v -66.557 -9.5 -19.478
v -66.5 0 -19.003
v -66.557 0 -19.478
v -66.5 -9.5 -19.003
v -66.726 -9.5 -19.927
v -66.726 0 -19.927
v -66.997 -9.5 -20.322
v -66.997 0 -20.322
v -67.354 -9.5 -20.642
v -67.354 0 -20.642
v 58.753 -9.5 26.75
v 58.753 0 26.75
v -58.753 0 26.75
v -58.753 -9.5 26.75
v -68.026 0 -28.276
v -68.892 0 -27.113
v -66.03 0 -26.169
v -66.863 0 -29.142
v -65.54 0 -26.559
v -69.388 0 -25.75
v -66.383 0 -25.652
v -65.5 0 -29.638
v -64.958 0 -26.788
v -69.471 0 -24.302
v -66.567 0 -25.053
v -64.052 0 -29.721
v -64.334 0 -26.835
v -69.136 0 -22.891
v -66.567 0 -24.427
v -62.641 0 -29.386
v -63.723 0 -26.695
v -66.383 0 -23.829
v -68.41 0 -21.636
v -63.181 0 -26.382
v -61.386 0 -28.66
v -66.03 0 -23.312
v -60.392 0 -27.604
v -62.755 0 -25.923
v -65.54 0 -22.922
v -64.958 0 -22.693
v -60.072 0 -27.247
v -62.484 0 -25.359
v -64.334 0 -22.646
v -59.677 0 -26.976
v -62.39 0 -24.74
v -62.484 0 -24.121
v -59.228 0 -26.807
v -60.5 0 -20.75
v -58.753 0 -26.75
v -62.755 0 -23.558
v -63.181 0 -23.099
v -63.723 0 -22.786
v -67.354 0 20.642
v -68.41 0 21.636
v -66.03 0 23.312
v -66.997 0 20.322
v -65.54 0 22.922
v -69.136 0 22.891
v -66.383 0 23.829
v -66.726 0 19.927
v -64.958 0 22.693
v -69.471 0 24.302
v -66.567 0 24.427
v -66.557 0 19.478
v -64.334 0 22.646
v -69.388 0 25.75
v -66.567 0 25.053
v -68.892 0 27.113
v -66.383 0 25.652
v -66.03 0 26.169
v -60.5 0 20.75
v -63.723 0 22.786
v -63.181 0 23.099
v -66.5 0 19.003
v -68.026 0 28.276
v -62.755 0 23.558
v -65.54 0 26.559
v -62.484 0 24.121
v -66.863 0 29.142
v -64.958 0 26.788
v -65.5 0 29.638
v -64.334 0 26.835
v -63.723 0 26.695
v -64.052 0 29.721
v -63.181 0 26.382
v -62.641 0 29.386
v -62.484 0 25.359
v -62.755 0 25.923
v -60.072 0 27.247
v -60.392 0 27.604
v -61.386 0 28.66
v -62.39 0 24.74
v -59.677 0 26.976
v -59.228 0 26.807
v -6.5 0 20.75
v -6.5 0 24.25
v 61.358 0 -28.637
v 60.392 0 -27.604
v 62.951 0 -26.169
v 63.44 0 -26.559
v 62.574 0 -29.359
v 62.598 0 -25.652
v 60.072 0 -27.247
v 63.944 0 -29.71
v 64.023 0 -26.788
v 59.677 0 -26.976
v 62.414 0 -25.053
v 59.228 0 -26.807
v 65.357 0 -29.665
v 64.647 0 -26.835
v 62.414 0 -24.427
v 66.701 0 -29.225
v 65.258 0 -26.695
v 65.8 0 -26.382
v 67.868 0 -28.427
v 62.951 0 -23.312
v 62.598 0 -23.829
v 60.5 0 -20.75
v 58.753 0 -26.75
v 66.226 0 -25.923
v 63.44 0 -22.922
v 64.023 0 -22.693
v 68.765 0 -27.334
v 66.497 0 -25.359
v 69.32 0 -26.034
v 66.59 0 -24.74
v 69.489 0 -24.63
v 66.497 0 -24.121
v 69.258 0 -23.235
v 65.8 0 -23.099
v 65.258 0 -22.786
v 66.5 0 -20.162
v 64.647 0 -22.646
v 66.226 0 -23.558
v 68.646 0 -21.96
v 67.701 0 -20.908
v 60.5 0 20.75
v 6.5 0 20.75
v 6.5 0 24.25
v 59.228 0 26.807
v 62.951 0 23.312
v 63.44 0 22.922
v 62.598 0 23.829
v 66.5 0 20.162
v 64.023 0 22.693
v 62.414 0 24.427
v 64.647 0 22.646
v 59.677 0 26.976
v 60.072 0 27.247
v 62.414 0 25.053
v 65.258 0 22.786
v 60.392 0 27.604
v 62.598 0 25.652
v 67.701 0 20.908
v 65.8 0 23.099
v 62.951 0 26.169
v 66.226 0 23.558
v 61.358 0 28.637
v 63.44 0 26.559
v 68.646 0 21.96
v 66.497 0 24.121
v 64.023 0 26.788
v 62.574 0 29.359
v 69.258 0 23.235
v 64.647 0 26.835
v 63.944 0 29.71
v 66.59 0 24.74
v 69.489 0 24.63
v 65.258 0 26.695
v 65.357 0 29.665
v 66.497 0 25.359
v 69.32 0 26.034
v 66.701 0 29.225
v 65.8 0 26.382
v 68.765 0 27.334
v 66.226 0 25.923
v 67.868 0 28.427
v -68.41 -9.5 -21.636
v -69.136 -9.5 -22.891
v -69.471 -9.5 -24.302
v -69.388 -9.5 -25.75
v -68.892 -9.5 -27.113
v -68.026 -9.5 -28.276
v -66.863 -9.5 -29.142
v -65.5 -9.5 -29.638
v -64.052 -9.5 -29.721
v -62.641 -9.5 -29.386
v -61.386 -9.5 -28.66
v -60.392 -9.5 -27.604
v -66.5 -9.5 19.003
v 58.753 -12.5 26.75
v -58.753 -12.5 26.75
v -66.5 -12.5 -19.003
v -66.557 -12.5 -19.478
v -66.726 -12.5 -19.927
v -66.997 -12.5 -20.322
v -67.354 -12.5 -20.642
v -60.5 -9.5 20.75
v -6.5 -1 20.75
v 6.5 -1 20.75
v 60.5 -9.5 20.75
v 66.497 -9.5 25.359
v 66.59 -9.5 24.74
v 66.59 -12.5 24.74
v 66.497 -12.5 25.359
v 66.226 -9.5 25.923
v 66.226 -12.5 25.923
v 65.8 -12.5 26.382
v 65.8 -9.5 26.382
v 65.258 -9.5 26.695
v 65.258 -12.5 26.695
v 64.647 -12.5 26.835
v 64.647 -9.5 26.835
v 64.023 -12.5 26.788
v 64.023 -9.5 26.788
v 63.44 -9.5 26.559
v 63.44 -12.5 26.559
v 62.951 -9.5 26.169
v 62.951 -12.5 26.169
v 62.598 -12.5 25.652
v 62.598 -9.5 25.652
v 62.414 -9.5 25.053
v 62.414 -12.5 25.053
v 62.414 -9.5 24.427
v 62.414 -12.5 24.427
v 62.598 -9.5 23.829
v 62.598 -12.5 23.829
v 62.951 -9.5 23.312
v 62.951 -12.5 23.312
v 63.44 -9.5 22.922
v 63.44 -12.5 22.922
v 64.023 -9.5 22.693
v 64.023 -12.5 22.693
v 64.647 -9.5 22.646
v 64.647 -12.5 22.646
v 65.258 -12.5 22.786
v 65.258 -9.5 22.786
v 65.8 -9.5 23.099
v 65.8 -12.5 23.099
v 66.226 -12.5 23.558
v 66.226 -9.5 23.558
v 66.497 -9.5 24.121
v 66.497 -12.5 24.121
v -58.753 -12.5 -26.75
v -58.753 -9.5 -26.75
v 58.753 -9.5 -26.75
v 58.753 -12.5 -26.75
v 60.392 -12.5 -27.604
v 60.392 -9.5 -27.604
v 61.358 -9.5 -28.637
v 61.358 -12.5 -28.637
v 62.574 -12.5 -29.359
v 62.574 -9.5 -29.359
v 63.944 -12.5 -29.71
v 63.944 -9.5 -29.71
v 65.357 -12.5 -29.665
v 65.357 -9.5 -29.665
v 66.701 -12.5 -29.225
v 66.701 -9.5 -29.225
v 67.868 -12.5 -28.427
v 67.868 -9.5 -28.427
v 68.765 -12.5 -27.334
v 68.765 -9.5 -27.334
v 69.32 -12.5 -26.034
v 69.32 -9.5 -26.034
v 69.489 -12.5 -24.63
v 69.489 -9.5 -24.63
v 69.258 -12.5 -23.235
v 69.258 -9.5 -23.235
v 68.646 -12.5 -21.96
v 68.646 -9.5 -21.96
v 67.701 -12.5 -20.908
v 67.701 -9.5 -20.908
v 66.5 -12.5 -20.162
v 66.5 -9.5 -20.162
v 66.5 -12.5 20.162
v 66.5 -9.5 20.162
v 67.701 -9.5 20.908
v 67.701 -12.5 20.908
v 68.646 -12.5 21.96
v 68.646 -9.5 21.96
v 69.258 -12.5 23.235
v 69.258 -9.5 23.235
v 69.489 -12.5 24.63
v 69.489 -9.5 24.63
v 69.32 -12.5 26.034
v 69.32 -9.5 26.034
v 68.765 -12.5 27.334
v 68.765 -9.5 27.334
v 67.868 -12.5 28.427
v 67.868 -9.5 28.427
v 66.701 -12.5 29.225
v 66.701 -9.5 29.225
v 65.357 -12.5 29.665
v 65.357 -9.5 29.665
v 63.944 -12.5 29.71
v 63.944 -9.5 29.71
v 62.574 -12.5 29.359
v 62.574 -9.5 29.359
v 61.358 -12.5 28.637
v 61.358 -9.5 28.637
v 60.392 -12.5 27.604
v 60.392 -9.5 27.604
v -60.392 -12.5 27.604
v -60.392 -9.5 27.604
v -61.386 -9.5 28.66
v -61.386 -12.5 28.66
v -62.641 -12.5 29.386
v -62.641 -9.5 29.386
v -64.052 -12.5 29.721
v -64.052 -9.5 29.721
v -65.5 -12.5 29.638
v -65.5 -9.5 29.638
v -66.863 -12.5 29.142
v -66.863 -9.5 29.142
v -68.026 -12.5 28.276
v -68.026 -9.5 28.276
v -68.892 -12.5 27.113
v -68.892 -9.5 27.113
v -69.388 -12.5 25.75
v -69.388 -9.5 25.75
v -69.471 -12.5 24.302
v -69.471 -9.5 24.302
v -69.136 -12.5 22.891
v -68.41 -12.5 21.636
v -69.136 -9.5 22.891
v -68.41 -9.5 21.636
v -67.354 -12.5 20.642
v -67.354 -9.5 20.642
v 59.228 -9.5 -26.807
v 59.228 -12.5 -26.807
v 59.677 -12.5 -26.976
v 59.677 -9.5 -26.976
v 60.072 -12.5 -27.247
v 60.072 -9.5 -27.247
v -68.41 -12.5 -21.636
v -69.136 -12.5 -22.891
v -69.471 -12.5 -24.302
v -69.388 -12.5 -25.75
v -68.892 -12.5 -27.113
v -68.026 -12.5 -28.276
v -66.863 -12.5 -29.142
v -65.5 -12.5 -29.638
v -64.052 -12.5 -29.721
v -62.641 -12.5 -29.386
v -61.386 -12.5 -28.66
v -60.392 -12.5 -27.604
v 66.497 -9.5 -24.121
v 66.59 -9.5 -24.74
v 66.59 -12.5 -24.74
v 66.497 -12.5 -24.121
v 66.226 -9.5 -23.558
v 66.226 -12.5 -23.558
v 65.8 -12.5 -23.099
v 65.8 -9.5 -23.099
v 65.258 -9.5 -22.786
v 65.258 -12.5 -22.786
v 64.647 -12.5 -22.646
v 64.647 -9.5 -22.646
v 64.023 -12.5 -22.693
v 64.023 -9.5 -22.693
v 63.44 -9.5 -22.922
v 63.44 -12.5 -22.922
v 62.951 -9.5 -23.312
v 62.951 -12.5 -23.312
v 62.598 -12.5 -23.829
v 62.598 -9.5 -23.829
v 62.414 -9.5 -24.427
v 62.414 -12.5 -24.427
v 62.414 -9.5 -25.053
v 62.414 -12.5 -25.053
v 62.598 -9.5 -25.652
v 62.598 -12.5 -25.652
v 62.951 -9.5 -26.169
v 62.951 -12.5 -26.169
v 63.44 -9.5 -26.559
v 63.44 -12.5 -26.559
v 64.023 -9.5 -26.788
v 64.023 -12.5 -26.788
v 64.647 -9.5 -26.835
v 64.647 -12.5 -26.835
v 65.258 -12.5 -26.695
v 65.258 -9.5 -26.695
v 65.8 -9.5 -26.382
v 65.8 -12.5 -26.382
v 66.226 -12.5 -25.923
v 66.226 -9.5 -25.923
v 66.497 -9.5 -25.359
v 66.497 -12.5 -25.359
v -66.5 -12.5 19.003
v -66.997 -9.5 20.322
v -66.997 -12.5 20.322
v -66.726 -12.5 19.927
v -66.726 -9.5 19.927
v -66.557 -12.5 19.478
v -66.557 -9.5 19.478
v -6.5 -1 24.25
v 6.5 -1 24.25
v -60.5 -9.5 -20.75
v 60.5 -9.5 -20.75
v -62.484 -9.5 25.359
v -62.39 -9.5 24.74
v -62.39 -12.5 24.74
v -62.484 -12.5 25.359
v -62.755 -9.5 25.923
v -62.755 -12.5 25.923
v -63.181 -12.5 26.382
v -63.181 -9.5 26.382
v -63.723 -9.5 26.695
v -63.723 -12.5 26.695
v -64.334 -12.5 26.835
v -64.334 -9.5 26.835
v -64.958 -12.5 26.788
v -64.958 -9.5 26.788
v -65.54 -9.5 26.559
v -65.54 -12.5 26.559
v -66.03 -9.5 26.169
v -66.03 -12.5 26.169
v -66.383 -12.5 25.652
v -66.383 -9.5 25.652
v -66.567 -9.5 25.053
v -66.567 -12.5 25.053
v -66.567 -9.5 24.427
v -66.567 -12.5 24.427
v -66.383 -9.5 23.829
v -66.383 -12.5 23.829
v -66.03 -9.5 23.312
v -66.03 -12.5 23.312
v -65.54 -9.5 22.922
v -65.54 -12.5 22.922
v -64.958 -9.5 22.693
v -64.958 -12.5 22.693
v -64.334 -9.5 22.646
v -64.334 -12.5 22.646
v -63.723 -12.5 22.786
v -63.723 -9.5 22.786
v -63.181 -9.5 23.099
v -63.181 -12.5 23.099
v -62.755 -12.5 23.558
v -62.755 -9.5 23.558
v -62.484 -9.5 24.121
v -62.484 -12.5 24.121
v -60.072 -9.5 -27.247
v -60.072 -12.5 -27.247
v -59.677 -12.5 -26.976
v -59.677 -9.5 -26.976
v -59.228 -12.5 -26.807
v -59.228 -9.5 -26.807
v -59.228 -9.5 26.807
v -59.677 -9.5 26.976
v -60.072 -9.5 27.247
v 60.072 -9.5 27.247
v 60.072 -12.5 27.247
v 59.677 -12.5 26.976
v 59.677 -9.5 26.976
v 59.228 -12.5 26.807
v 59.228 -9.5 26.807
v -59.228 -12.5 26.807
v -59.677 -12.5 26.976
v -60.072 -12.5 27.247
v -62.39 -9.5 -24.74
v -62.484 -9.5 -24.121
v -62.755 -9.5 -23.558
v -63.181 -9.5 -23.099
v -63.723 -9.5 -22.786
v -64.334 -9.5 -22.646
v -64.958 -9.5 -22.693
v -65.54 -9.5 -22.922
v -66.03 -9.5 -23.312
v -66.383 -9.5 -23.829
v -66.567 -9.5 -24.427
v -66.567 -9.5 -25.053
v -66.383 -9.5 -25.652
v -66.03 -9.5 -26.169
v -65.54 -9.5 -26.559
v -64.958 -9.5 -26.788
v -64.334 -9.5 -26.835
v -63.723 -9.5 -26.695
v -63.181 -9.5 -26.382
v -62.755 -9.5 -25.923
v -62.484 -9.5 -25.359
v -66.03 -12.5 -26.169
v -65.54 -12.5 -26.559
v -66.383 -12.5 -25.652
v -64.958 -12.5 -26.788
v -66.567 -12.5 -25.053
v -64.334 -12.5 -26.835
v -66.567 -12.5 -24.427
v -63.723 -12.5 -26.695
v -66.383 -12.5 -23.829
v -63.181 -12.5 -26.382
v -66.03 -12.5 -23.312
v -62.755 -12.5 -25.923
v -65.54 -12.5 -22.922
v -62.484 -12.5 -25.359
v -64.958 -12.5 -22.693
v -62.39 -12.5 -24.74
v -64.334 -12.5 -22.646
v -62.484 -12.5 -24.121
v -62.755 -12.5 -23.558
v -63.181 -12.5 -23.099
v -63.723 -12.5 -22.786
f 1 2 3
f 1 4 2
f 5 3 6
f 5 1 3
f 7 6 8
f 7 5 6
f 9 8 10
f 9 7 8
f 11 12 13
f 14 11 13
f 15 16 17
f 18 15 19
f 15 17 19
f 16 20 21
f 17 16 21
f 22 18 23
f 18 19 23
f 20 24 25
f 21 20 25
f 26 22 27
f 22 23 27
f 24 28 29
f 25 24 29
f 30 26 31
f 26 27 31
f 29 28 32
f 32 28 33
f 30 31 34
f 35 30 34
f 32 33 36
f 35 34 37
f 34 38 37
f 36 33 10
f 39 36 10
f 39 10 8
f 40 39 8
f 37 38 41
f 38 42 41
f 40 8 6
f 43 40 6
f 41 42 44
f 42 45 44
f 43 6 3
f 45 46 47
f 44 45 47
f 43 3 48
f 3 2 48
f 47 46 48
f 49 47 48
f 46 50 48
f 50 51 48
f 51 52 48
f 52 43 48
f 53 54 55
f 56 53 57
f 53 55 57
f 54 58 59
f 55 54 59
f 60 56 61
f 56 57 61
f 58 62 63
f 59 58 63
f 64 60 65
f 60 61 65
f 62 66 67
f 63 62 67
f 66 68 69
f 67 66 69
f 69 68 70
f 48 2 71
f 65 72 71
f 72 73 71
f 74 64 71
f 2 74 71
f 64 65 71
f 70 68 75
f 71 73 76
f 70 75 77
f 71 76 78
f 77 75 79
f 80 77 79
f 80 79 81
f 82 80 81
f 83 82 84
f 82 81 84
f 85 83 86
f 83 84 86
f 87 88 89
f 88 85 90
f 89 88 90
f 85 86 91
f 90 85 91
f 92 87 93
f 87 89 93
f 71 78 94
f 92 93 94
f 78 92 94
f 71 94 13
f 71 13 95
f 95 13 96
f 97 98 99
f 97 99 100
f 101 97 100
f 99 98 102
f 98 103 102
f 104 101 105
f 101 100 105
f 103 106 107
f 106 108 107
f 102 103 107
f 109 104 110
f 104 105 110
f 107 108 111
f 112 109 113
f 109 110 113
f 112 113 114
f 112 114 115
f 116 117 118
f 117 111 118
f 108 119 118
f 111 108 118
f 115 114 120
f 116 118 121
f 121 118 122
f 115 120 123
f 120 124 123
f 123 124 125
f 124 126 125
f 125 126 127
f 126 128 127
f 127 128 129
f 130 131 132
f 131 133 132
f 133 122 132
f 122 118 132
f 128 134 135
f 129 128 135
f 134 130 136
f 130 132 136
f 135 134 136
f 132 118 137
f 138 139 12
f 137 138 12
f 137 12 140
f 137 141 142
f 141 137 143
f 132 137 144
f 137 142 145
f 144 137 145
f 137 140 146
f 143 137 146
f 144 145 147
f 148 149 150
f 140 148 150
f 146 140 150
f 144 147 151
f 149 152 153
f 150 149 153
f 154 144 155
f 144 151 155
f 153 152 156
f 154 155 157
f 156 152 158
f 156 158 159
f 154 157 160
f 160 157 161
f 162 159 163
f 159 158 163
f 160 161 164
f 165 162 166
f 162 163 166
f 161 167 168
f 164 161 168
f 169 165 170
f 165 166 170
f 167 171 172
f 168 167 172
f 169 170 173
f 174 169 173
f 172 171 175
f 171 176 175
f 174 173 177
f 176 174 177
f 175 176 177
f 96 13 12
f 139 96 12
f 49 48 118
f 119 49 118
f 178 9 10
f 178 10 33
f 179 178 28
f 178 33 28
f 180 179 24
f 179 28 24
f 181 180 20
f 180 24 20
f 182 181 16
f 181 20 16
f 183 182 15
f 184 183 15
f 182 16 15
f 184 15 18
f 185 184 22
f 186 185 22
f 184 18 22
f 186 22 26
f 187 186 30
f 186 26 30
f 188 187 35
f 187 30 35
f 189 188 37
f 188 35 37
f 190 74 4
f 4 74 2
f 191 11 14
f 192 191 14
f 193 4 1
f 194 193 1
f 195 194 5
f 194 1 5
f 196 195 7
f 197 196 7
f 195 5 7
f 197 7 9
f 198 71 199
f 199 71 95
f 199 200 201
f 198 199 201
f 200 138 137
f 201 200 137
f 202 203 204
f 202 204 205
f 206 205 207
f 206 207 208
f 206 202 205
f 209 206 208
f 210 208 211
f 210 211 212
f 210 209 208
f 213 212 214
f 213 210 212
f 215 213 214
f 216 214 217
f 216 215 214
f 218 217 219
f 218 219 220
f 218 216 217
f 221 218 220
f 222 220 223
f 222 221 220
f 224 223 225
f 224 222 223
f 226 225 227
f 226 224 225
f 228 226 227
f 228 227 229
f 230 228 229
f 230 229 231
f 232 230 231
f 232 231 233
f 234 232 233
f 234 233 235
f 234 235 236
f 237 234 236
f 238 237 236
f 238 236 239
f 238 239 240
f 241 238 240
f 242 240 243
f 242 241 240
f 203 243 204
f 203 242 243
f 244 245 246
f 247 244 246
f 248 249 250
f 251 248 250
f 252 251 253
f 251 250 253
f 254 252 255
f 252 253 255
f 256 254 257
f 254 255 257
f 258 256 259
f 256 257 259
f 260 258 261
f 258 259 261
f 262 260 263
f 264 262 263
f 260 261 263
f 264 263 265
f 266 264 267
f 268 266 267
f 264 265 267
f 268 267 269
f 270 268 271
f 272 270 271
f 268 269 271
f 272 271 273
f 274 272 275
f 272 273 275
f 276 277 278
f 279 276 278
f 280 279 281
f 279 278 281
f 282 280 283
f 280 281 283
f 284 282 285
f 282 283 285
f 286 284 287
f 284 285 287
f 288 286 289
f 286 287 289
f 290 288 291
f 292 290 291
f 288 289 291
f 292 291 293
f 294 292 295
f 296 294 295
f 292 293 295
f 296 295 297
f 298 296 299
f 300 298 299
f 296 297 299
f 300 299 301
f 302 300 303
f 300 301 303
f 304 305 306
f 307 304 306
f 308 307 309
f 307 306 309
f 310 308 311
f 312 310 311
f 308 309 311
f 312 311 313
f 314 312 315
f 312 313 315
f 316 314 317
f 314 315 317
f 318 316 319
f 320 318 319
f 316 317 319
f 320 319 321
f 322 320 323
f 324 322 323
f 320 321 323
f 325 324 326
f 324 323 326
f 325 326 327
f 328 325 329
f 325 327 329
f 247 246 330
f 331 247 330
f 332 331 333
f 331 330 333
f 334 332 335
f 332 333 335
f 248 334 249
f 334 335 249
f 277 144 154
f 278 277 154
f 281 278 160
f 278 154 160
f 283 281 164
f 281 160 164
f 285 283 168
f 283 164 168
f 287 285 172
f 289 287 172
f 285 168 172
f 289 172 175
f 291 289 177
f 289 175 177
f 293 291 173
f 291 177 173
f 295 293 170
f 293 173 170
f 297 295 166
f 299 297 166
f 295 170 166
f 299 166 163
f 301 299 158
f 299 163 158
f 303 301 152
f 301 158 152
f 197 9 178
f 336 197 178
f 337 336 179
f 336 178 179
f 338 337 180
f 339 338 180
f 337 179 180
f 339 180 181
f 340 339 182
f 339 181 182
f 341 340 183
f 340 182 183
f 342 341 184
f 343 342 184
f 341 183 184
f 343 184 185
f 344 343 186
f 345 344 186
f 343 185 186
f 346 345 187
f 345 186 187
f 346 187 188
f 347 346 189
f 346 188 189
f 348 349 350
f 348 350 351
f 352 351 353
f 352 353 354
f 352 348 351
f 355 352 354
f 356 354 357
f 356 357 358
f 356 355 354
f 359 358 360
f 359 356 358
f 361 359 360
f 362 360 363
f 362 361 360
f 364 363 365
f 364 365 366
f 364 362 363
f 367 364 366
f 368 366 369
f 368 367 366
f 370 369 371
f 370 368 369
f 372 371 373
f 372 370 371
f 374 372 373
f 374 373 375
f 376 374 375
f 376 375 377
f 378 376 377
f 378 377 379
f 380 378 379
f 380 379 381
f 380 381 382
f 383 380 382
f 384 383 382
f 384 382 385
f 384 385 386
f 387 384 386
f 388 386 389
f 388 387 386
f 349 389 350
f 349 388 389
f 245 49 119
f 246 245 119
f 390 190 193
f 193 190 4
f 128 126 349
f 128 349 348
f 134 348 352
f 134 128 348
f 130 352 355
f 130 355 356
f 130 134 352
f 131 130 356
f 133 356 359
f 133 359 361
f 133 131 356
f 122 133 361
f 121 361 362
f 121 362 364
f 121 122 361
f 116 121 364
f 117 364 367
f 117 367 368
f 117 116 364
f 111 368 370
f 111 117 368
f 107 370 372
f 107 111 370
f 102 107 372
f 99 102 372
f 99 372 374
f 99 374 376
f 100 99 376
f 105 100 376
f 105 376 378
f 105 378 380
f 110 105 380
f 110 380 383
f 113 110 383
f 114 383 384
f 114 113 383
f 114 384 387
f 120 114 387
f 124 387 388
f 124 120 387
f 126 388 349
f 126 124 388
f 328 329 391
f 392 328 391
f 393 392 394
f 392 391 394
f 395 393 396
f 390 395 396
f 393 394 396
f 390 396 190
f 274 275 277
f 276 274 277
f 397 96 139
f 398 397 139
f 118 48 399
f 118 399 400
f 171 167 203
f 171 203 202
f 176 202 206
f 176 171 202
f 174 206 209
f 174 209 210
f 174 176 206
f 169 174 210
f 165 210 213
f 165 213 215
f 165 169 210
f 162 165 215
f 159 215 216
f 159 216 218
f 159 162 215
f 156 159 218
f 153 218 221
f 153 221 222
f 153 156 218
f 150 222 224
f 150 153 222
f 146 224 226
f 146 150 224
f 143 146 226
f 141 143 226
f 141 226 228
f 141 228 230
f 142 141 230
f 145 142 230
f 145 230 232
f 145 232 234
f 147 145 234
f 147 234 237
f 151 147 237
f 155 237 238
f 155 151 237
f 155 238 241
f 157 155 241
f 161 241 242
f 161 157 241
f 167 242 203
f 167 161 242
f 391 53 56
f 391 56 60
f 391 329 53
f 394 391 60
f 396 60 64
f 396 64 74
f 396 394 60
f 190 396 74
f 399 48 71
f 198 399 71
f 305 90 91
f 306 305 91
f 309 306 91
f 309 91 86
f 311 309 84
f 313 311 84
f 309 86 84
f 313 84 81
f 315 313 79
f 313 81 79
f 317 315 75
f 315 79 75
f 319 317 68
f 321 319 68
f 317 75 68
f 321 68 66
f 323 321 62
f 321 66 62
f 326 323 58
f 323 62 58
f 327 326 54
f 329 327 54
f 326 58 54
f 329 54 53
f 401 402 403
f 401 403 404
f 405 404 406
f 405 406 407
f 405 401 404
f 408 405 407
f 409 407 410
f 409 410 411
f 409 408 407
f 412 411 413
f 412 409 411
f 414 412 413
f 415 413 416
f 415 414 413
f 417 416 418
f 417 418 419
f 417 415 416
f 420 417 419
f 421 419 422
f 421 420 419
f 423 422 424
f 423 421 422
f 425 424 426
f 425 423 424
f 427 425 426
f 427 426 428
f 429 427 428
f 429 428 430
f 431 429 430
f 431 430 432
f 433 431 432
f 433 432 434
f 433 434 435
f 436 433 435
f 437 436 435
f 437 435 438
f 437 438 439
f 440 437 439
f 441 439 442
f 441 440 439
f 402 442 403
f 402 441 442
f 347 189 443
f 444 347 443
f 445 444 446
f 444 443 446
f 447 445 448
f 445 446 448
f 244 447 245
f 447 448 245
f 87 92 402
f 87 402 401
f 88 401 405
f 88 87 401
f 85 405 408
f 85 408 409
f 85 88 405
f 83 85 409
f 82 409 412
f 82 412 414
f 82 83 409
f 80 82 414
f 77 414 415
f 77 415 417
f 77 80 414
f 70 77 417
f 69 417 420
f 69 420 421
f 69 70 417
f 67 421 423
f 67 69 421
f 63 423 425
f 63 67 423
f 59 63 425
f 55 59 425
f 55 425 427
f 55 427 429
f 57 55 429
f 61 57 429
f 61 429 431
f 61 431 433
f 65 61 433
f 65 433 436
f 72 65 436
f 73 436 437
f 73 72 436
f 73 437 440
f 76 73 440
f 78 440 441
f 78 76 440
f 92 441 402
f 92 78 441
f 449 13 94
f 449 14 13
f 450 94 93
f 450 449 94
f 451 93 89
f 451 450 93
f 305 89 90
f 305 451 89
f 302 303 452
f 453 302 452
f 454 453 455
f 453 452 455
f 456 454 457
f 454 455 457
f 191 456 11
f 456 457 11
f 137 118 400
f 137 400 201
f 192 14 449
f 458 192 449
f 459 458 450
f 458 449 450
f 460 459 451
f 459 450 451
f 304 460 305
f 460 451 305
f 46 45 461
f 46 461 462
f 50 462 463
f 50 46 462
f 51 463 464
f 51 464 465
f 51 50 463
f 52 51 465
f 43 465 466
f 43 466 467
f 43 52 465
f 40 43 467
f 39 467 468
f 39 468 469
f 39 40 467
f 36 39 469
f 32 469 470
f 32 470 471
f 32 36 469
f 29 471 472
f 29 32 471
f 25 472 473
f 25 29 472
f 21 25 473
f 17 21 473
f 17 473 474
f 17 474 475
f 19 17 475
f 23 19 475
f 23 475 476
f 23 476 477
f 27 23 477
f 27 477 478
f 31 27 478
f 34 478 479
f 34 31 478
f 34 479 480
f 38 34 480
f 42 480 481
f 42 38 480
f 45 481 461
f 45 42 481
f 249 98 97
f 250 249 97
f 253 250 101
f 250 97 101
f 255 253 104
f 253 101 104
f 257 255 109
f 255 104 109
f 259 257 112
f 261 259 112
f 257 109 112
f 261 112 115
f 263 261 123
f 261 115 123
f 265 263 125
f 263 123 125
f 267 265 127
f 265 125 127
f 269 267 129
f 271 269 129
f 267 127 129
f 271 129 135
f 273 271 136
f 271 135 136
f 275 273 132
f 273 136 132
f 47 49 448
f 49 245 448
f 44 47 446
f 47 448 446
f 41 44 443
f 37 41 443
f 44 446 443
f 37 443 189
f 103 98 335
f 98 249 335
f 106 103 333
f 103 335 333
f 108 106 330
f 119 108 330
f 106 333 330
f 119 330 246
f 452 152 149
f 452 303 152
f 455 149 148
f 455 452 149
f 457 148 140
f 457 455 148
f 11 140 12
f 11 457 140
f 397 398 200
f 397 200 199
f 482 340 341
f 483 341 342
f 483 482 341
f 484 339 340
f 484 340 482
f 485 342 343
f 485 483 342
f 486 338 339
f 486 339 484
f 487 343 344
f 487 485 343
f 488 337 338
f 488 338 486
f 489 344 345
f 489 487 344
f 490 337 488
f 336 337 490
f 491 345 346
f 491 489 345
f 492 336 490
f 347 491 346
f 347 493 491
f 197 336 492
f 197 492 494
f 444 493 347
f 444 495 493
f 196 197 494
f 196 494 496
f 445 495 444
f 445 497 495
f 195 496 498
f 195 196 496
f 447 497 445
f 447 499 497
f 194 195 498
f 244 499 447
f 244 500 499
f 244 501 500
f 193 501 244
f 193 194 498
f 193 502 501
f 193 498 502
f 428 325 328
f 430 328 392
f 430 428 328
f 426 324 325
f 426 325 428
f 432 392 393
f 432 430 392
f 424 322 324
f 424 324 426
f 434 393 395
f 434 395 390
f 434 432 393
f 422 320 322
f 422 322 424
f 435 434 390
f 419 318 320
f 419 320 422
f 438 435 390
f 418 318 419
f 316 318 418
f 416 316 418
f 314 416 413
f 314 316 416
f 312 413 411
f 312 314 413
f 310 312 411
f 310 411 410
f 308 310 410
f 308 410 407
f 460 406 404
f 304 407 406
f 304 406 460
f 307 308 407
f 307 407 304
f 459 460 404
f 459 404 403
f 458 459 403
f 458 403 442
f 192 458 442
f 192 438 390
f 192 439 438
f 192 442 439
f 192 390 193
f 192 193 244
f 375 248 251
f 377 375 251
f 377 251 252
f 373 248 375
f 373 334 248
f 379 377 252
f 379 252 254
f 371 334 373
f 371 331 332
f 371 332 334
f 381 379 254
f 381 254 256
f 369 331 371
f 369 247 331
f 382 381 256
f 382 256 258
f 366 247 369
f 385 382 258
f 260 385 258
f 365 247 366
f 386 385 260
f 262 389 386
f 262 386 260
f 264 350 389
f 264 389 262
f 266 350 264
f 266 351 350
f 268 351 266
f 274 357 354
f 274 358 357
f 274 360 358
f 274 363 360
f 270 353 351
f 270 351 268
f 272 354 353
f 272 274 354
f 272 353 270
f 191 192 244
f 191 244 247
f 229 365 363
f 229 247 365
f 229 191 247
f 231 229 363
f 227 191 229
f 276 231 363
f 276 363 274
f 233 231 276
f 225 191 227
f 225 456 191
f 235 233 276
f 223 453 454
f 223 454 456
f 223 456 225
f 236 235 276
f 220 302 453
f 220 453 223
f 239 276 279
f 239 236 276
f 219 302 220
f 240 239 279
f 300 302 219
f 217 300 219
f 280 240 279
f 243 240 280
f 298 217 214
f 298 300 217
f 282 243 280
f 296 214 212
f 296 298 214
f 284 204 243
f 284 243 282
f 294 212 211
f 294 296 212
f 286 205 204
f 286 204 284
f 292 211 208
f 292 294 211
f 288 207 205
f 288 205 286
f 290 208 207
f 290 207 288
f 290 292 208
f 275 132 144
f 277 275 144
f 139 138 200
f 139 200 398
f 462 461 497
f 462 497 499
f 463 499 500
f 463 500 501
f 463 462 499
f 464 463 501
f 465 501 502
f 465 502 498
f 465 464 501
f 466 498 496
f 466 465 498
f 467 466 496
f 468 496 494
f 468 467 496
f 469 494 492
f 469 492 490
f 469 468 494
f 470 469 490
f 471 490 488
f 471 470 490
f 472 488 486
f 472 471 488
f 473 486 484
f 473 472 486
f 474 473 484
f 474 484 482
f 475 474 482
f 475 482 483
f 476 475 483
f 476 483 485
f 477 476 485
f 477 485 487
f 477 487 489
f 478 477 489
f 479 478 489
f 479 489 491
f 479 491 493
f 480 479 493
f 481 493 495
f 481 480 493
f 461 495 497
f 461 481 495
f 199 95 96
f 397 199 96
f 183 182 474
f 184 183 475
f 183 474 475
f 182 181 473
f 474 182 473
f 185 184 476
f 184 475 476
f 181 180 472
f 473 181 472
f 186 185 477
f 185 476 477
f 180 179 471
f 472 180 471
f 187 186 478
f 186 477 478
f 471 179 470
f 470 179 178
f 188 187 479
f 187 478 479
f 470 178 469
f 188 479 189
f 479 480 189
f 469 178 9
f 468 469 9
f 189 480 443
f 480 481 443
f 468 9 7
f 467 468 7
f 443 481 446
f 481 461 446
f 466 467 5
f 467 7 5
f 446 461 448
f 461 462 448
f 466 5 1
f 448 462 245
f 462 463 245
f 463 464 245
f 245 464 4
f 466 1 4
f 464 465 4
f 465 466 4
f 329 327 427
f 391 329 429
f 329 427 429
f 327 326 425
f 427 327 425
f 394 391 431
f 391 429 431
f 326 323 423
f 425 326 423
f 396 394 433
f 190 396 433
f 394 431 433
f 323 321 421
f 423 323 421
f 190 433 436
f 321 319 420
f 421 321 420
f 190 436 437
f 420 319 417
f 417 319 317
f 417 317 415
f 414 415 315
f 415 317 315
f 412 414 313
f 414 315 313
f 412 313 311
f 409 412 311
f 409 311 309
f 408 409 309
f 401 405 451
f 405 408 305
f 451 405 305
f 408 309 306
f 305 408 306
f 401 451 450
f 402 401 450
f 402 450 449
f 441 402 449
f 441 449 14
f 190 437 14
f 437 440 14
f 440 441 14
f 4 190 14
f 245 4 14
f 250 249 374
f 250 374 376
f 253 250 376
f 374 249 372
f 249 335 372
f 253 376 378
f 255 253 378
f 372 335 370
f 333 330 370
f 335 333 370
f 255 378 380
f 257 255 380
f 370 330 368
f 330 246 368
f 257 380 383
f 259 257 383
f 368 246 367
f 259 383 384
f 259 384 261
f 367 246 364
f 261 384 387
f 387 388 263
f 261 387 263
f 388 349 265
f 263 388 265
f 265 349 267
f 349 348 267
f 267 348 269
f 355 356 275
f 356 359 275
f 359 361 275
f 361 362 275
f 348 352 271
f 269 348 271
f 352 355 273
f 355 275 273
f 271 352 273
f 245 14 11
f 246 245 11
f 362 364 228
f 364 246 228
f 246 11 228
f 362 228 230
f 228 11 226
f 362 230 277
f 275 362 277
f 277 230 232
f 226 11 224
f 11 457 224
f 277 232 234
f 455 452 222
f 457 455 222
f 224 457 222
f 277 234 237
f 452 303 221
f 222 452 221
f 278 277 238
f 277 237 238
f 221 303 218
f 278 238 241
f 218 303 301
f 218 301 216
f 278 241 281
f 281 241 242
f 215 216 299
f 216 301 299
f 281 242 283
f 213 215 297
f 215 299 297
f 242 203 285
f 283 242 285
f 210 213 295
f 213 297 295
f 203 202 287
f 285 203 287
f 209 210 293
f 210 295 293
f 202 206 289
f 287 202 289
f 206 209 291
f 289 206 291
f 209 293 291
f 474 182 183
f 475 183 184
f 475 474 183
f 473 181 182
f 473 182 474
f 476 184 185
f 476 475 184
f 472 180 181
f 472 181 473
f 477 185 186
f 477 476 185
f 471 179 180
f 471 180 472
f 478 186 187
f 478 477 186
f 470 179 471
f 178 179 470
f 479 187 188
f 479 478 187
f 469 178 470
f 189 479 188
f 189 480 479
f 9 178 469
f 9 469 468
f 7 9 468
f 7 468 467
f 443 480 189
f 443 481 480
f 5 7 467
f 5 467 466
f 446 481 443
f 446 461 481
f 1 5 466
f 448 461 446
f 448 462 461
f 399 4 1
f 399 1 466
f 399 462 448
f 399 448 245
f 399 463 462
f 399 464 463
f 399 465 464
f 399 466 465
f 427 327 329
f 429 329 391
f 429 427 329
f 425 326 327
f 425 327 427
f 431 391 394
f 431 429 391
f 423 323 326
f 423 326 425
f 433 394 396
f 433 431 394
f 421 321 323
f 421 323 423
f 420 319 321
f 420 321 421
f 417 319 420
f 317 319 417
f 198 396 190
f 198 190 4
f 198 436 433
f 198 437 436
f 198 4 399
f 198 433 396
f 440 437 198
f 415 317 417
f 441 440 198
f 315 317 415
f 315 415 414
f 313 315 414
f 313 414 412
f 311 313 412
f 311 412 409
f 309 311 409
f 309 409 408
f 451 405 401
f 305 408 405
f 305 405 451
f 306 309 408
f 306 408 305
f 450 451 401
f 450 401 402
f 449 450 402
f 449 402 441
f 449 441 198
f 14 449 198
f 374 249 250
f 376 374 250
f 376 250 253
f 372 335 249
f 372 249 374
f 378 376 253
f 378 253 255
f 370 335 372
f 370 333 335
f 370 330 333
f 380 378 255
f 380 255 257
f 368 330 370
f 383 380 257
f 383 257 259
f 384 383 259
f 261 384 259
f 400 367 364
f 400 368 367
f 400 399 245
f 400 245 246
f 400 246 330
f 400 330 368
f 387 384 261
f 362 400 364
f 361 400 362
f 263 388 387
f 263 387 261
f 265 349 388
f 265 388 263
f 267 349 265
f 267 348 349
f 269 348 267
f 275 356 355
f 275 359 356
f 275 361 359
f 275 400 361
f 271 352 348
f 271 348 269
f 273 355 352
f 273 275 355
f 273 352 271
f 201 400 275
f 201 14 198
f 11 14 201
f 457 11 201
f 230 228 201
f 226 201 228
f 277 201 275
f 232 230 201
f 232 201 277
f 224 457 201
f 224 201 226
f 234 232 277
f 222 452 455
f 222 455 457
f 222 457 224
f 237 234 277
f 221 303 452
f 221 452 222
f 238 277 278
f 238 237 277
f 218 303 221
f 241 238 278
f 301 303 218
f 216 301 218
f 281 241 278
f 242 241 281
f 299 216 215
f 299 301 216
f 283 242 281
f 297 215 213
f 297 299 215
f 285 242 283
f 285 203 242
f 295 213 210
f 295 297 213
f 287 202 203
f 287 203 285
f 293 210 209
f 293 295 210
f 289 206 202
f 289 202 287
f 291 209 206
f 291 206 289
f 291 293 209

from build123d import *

# Parameters (mm, degrees)
F0_R     = 2.1
F0_W     = 121
F0_H     = 41.5
F1_DEPTH = 9.5
F2_R     = 2
F3_W     = 6.5
F3_H     = 3.5
F4_DEPTH = 1
F6_R     = 2.1
F7_DEPTH = 3


with BuildPart() as f1:
    # F0 (on Front) → F1 (new body)
    with BuildSketch(Plane.XZ):
        with BuildLine():
            ThreePointArc((66.5, 20.1620689322), (68.0260102981, 28.2760102981), (59.9120689322, 26.75))
            Line((59.9120689322, 26.75), (-59.9120689322, 26.75))
            ThreePointArc((-59.9120689322, 26.75), (-68.0260102981, 28.2760102981), (-66.5, 20.1620689322))
            Line((-66.5, 20.1620689322), (-66.5, -20.1620689322))
            ThreePointArc((-66.5, -20.1620689322), (-68.0260102981, -28.2760102981), (-59.9120689322, -26.75))
            Line((-59.9120689322, -26.75), (59.9120689322, -26.75))
            ThreePointArc((59.9120689322, -26.75), (68.0260102981, -28.2760102981), (66.5, -20.1620689322))
            Line((66.5, -20.1620689322), (66.5, 20.1620689322))
        make_face()
        with Locations((-64.4904763922, -24.7404763922)):
            Circle(F0_R, mode=Mode.SUBTRACT)
        with Locations((64.4904763922, -24.7404763922)):
            Circle(F0_R, mode=Mode.SUBTRACT)
        Rectangle(F0_W, F0_H, mode=Mode.SUBTRACT)
        with Locations((-64.4904763922, 24.7404763922)):
            Circle(F0_R, mode=Mode.SUBTRACT)
        with Locations((64.4904763922, 24.7404763922)):
            Circle(F0_R, mode=Mode.SUBTRACT)
    extrude(amount=F1_DEPTH)

    # F2
    f2_edges = [f1.edges().sort_by_distance(p)[0] for p in [
        (-59.912069, -4.75, 26.75),
        (-66.5, -4.75, 20.162069),
        (-66.5, -4.75, -20.162069),
        (-59.912069, -4.75, -26.75),
        (59.912069, -4.75, -26.75),
        (59.912069, -4.75, 26.75),
    ]]
    fillet(f2_edges, radius=F2_R)

    # F3 (on face) → F4 (cut)
    with BuildSketch(Plane(origin=(0, 0, 0), x_dir=(-1, 0, 0), z_dir=(0, 1, 0))):
        with Locations((-3.25, 22.5)):
            Rectangle(F3_W, F3_H)
        with Locations((3.25, 22.5)):
            Rectangle(F3_W, F3_H)
    extrude(amount=-F4_DEPTH, mode=Mode.SUBTRACT)


with BuildPart() as f7:
    # F6 (on offset) → F7 (new body)
    with BuildSketch(Plane.XZ.offset(9.5)):
        with BuildLine():
            Line((66.5, -20.1620689322), (66.5, 20.1620689322))
            ThreePointArc((66.5, 20.1620689322), (68.3554633659, 27.9125223713), (60.3919624481, 27.6044218263))
            ThreePointArc((60.3919624481, 27.6044218263), (59.6769062775, 26.976422211), (58.7525568704, 26.75))
            Line((58.7525568704, 26.75), (-58.7525568704, 26.75))
            ThreePointArc((-58.7525568704, 26.75), (-59.6769062775, 26.976422211), (-60.3919624481, 27.6044218263))
            ThreePointArc((-60.3919624481, 27.6044218263), (-68.0260102981, 28.2760102981), (-67.3544218263, 20.6419624481))
            ThreePointArc((-67.3544218263, 20.6419624481), (-66.726422211, 19.9269062775), (-66.5, 19.0025568704))
            Line((-66.5, 19.0025568704), (-66.5, -19.0025568704))
            ThreePointArc((-66.5, -19.0025568704), (-66.726422211, -19.9269062775), (-67.3544218263, -20.6419624481))
            ThreePointArc((-67.3544218263, -20.6419624481), (-68.0260102981, -28.2760102981), (-60.3919624481, -27.6044218263))
            ThreePointArc((-60.3919624481, -27.6044218263), (-59.6769062775, -26.976422211), (-58.7525568704, -26.75))
            Line((-58.7525568704, -26.75), (58.7525568704, -26.75))
            ThreePointArc((58.7525568704, -26.75), (59.6769062775, -26.976422211), (60.3919624481, -27.6044218263))
            ThreePointArc((60.3919624481, -27.6044218263), (68.3554633659, -27.9125223713), (66.5, -20.1620689322))
        make_face()
        with Locations((-64.4904763922, -24.7404763922)):
            Circle(F6_R, mode=Mode.SUBTRACT)
        with Locations((64.4904763922, -24.7404763922)):
            Circle(F6_R, mode=Mode.SUBTRACT)
        with Locations((-64.4904763922, 24.7404763922)):
            Circle(F6_R, mode=Mode.SUBTRACT)
        with Locations((64.4904763922, 24.7404763922)):
            Circle(F6_R, mode=Mode.SUBTRACT)
    extrude(amount=F7_DEPTH)


solid = Compound([f1.part, f7.part])
